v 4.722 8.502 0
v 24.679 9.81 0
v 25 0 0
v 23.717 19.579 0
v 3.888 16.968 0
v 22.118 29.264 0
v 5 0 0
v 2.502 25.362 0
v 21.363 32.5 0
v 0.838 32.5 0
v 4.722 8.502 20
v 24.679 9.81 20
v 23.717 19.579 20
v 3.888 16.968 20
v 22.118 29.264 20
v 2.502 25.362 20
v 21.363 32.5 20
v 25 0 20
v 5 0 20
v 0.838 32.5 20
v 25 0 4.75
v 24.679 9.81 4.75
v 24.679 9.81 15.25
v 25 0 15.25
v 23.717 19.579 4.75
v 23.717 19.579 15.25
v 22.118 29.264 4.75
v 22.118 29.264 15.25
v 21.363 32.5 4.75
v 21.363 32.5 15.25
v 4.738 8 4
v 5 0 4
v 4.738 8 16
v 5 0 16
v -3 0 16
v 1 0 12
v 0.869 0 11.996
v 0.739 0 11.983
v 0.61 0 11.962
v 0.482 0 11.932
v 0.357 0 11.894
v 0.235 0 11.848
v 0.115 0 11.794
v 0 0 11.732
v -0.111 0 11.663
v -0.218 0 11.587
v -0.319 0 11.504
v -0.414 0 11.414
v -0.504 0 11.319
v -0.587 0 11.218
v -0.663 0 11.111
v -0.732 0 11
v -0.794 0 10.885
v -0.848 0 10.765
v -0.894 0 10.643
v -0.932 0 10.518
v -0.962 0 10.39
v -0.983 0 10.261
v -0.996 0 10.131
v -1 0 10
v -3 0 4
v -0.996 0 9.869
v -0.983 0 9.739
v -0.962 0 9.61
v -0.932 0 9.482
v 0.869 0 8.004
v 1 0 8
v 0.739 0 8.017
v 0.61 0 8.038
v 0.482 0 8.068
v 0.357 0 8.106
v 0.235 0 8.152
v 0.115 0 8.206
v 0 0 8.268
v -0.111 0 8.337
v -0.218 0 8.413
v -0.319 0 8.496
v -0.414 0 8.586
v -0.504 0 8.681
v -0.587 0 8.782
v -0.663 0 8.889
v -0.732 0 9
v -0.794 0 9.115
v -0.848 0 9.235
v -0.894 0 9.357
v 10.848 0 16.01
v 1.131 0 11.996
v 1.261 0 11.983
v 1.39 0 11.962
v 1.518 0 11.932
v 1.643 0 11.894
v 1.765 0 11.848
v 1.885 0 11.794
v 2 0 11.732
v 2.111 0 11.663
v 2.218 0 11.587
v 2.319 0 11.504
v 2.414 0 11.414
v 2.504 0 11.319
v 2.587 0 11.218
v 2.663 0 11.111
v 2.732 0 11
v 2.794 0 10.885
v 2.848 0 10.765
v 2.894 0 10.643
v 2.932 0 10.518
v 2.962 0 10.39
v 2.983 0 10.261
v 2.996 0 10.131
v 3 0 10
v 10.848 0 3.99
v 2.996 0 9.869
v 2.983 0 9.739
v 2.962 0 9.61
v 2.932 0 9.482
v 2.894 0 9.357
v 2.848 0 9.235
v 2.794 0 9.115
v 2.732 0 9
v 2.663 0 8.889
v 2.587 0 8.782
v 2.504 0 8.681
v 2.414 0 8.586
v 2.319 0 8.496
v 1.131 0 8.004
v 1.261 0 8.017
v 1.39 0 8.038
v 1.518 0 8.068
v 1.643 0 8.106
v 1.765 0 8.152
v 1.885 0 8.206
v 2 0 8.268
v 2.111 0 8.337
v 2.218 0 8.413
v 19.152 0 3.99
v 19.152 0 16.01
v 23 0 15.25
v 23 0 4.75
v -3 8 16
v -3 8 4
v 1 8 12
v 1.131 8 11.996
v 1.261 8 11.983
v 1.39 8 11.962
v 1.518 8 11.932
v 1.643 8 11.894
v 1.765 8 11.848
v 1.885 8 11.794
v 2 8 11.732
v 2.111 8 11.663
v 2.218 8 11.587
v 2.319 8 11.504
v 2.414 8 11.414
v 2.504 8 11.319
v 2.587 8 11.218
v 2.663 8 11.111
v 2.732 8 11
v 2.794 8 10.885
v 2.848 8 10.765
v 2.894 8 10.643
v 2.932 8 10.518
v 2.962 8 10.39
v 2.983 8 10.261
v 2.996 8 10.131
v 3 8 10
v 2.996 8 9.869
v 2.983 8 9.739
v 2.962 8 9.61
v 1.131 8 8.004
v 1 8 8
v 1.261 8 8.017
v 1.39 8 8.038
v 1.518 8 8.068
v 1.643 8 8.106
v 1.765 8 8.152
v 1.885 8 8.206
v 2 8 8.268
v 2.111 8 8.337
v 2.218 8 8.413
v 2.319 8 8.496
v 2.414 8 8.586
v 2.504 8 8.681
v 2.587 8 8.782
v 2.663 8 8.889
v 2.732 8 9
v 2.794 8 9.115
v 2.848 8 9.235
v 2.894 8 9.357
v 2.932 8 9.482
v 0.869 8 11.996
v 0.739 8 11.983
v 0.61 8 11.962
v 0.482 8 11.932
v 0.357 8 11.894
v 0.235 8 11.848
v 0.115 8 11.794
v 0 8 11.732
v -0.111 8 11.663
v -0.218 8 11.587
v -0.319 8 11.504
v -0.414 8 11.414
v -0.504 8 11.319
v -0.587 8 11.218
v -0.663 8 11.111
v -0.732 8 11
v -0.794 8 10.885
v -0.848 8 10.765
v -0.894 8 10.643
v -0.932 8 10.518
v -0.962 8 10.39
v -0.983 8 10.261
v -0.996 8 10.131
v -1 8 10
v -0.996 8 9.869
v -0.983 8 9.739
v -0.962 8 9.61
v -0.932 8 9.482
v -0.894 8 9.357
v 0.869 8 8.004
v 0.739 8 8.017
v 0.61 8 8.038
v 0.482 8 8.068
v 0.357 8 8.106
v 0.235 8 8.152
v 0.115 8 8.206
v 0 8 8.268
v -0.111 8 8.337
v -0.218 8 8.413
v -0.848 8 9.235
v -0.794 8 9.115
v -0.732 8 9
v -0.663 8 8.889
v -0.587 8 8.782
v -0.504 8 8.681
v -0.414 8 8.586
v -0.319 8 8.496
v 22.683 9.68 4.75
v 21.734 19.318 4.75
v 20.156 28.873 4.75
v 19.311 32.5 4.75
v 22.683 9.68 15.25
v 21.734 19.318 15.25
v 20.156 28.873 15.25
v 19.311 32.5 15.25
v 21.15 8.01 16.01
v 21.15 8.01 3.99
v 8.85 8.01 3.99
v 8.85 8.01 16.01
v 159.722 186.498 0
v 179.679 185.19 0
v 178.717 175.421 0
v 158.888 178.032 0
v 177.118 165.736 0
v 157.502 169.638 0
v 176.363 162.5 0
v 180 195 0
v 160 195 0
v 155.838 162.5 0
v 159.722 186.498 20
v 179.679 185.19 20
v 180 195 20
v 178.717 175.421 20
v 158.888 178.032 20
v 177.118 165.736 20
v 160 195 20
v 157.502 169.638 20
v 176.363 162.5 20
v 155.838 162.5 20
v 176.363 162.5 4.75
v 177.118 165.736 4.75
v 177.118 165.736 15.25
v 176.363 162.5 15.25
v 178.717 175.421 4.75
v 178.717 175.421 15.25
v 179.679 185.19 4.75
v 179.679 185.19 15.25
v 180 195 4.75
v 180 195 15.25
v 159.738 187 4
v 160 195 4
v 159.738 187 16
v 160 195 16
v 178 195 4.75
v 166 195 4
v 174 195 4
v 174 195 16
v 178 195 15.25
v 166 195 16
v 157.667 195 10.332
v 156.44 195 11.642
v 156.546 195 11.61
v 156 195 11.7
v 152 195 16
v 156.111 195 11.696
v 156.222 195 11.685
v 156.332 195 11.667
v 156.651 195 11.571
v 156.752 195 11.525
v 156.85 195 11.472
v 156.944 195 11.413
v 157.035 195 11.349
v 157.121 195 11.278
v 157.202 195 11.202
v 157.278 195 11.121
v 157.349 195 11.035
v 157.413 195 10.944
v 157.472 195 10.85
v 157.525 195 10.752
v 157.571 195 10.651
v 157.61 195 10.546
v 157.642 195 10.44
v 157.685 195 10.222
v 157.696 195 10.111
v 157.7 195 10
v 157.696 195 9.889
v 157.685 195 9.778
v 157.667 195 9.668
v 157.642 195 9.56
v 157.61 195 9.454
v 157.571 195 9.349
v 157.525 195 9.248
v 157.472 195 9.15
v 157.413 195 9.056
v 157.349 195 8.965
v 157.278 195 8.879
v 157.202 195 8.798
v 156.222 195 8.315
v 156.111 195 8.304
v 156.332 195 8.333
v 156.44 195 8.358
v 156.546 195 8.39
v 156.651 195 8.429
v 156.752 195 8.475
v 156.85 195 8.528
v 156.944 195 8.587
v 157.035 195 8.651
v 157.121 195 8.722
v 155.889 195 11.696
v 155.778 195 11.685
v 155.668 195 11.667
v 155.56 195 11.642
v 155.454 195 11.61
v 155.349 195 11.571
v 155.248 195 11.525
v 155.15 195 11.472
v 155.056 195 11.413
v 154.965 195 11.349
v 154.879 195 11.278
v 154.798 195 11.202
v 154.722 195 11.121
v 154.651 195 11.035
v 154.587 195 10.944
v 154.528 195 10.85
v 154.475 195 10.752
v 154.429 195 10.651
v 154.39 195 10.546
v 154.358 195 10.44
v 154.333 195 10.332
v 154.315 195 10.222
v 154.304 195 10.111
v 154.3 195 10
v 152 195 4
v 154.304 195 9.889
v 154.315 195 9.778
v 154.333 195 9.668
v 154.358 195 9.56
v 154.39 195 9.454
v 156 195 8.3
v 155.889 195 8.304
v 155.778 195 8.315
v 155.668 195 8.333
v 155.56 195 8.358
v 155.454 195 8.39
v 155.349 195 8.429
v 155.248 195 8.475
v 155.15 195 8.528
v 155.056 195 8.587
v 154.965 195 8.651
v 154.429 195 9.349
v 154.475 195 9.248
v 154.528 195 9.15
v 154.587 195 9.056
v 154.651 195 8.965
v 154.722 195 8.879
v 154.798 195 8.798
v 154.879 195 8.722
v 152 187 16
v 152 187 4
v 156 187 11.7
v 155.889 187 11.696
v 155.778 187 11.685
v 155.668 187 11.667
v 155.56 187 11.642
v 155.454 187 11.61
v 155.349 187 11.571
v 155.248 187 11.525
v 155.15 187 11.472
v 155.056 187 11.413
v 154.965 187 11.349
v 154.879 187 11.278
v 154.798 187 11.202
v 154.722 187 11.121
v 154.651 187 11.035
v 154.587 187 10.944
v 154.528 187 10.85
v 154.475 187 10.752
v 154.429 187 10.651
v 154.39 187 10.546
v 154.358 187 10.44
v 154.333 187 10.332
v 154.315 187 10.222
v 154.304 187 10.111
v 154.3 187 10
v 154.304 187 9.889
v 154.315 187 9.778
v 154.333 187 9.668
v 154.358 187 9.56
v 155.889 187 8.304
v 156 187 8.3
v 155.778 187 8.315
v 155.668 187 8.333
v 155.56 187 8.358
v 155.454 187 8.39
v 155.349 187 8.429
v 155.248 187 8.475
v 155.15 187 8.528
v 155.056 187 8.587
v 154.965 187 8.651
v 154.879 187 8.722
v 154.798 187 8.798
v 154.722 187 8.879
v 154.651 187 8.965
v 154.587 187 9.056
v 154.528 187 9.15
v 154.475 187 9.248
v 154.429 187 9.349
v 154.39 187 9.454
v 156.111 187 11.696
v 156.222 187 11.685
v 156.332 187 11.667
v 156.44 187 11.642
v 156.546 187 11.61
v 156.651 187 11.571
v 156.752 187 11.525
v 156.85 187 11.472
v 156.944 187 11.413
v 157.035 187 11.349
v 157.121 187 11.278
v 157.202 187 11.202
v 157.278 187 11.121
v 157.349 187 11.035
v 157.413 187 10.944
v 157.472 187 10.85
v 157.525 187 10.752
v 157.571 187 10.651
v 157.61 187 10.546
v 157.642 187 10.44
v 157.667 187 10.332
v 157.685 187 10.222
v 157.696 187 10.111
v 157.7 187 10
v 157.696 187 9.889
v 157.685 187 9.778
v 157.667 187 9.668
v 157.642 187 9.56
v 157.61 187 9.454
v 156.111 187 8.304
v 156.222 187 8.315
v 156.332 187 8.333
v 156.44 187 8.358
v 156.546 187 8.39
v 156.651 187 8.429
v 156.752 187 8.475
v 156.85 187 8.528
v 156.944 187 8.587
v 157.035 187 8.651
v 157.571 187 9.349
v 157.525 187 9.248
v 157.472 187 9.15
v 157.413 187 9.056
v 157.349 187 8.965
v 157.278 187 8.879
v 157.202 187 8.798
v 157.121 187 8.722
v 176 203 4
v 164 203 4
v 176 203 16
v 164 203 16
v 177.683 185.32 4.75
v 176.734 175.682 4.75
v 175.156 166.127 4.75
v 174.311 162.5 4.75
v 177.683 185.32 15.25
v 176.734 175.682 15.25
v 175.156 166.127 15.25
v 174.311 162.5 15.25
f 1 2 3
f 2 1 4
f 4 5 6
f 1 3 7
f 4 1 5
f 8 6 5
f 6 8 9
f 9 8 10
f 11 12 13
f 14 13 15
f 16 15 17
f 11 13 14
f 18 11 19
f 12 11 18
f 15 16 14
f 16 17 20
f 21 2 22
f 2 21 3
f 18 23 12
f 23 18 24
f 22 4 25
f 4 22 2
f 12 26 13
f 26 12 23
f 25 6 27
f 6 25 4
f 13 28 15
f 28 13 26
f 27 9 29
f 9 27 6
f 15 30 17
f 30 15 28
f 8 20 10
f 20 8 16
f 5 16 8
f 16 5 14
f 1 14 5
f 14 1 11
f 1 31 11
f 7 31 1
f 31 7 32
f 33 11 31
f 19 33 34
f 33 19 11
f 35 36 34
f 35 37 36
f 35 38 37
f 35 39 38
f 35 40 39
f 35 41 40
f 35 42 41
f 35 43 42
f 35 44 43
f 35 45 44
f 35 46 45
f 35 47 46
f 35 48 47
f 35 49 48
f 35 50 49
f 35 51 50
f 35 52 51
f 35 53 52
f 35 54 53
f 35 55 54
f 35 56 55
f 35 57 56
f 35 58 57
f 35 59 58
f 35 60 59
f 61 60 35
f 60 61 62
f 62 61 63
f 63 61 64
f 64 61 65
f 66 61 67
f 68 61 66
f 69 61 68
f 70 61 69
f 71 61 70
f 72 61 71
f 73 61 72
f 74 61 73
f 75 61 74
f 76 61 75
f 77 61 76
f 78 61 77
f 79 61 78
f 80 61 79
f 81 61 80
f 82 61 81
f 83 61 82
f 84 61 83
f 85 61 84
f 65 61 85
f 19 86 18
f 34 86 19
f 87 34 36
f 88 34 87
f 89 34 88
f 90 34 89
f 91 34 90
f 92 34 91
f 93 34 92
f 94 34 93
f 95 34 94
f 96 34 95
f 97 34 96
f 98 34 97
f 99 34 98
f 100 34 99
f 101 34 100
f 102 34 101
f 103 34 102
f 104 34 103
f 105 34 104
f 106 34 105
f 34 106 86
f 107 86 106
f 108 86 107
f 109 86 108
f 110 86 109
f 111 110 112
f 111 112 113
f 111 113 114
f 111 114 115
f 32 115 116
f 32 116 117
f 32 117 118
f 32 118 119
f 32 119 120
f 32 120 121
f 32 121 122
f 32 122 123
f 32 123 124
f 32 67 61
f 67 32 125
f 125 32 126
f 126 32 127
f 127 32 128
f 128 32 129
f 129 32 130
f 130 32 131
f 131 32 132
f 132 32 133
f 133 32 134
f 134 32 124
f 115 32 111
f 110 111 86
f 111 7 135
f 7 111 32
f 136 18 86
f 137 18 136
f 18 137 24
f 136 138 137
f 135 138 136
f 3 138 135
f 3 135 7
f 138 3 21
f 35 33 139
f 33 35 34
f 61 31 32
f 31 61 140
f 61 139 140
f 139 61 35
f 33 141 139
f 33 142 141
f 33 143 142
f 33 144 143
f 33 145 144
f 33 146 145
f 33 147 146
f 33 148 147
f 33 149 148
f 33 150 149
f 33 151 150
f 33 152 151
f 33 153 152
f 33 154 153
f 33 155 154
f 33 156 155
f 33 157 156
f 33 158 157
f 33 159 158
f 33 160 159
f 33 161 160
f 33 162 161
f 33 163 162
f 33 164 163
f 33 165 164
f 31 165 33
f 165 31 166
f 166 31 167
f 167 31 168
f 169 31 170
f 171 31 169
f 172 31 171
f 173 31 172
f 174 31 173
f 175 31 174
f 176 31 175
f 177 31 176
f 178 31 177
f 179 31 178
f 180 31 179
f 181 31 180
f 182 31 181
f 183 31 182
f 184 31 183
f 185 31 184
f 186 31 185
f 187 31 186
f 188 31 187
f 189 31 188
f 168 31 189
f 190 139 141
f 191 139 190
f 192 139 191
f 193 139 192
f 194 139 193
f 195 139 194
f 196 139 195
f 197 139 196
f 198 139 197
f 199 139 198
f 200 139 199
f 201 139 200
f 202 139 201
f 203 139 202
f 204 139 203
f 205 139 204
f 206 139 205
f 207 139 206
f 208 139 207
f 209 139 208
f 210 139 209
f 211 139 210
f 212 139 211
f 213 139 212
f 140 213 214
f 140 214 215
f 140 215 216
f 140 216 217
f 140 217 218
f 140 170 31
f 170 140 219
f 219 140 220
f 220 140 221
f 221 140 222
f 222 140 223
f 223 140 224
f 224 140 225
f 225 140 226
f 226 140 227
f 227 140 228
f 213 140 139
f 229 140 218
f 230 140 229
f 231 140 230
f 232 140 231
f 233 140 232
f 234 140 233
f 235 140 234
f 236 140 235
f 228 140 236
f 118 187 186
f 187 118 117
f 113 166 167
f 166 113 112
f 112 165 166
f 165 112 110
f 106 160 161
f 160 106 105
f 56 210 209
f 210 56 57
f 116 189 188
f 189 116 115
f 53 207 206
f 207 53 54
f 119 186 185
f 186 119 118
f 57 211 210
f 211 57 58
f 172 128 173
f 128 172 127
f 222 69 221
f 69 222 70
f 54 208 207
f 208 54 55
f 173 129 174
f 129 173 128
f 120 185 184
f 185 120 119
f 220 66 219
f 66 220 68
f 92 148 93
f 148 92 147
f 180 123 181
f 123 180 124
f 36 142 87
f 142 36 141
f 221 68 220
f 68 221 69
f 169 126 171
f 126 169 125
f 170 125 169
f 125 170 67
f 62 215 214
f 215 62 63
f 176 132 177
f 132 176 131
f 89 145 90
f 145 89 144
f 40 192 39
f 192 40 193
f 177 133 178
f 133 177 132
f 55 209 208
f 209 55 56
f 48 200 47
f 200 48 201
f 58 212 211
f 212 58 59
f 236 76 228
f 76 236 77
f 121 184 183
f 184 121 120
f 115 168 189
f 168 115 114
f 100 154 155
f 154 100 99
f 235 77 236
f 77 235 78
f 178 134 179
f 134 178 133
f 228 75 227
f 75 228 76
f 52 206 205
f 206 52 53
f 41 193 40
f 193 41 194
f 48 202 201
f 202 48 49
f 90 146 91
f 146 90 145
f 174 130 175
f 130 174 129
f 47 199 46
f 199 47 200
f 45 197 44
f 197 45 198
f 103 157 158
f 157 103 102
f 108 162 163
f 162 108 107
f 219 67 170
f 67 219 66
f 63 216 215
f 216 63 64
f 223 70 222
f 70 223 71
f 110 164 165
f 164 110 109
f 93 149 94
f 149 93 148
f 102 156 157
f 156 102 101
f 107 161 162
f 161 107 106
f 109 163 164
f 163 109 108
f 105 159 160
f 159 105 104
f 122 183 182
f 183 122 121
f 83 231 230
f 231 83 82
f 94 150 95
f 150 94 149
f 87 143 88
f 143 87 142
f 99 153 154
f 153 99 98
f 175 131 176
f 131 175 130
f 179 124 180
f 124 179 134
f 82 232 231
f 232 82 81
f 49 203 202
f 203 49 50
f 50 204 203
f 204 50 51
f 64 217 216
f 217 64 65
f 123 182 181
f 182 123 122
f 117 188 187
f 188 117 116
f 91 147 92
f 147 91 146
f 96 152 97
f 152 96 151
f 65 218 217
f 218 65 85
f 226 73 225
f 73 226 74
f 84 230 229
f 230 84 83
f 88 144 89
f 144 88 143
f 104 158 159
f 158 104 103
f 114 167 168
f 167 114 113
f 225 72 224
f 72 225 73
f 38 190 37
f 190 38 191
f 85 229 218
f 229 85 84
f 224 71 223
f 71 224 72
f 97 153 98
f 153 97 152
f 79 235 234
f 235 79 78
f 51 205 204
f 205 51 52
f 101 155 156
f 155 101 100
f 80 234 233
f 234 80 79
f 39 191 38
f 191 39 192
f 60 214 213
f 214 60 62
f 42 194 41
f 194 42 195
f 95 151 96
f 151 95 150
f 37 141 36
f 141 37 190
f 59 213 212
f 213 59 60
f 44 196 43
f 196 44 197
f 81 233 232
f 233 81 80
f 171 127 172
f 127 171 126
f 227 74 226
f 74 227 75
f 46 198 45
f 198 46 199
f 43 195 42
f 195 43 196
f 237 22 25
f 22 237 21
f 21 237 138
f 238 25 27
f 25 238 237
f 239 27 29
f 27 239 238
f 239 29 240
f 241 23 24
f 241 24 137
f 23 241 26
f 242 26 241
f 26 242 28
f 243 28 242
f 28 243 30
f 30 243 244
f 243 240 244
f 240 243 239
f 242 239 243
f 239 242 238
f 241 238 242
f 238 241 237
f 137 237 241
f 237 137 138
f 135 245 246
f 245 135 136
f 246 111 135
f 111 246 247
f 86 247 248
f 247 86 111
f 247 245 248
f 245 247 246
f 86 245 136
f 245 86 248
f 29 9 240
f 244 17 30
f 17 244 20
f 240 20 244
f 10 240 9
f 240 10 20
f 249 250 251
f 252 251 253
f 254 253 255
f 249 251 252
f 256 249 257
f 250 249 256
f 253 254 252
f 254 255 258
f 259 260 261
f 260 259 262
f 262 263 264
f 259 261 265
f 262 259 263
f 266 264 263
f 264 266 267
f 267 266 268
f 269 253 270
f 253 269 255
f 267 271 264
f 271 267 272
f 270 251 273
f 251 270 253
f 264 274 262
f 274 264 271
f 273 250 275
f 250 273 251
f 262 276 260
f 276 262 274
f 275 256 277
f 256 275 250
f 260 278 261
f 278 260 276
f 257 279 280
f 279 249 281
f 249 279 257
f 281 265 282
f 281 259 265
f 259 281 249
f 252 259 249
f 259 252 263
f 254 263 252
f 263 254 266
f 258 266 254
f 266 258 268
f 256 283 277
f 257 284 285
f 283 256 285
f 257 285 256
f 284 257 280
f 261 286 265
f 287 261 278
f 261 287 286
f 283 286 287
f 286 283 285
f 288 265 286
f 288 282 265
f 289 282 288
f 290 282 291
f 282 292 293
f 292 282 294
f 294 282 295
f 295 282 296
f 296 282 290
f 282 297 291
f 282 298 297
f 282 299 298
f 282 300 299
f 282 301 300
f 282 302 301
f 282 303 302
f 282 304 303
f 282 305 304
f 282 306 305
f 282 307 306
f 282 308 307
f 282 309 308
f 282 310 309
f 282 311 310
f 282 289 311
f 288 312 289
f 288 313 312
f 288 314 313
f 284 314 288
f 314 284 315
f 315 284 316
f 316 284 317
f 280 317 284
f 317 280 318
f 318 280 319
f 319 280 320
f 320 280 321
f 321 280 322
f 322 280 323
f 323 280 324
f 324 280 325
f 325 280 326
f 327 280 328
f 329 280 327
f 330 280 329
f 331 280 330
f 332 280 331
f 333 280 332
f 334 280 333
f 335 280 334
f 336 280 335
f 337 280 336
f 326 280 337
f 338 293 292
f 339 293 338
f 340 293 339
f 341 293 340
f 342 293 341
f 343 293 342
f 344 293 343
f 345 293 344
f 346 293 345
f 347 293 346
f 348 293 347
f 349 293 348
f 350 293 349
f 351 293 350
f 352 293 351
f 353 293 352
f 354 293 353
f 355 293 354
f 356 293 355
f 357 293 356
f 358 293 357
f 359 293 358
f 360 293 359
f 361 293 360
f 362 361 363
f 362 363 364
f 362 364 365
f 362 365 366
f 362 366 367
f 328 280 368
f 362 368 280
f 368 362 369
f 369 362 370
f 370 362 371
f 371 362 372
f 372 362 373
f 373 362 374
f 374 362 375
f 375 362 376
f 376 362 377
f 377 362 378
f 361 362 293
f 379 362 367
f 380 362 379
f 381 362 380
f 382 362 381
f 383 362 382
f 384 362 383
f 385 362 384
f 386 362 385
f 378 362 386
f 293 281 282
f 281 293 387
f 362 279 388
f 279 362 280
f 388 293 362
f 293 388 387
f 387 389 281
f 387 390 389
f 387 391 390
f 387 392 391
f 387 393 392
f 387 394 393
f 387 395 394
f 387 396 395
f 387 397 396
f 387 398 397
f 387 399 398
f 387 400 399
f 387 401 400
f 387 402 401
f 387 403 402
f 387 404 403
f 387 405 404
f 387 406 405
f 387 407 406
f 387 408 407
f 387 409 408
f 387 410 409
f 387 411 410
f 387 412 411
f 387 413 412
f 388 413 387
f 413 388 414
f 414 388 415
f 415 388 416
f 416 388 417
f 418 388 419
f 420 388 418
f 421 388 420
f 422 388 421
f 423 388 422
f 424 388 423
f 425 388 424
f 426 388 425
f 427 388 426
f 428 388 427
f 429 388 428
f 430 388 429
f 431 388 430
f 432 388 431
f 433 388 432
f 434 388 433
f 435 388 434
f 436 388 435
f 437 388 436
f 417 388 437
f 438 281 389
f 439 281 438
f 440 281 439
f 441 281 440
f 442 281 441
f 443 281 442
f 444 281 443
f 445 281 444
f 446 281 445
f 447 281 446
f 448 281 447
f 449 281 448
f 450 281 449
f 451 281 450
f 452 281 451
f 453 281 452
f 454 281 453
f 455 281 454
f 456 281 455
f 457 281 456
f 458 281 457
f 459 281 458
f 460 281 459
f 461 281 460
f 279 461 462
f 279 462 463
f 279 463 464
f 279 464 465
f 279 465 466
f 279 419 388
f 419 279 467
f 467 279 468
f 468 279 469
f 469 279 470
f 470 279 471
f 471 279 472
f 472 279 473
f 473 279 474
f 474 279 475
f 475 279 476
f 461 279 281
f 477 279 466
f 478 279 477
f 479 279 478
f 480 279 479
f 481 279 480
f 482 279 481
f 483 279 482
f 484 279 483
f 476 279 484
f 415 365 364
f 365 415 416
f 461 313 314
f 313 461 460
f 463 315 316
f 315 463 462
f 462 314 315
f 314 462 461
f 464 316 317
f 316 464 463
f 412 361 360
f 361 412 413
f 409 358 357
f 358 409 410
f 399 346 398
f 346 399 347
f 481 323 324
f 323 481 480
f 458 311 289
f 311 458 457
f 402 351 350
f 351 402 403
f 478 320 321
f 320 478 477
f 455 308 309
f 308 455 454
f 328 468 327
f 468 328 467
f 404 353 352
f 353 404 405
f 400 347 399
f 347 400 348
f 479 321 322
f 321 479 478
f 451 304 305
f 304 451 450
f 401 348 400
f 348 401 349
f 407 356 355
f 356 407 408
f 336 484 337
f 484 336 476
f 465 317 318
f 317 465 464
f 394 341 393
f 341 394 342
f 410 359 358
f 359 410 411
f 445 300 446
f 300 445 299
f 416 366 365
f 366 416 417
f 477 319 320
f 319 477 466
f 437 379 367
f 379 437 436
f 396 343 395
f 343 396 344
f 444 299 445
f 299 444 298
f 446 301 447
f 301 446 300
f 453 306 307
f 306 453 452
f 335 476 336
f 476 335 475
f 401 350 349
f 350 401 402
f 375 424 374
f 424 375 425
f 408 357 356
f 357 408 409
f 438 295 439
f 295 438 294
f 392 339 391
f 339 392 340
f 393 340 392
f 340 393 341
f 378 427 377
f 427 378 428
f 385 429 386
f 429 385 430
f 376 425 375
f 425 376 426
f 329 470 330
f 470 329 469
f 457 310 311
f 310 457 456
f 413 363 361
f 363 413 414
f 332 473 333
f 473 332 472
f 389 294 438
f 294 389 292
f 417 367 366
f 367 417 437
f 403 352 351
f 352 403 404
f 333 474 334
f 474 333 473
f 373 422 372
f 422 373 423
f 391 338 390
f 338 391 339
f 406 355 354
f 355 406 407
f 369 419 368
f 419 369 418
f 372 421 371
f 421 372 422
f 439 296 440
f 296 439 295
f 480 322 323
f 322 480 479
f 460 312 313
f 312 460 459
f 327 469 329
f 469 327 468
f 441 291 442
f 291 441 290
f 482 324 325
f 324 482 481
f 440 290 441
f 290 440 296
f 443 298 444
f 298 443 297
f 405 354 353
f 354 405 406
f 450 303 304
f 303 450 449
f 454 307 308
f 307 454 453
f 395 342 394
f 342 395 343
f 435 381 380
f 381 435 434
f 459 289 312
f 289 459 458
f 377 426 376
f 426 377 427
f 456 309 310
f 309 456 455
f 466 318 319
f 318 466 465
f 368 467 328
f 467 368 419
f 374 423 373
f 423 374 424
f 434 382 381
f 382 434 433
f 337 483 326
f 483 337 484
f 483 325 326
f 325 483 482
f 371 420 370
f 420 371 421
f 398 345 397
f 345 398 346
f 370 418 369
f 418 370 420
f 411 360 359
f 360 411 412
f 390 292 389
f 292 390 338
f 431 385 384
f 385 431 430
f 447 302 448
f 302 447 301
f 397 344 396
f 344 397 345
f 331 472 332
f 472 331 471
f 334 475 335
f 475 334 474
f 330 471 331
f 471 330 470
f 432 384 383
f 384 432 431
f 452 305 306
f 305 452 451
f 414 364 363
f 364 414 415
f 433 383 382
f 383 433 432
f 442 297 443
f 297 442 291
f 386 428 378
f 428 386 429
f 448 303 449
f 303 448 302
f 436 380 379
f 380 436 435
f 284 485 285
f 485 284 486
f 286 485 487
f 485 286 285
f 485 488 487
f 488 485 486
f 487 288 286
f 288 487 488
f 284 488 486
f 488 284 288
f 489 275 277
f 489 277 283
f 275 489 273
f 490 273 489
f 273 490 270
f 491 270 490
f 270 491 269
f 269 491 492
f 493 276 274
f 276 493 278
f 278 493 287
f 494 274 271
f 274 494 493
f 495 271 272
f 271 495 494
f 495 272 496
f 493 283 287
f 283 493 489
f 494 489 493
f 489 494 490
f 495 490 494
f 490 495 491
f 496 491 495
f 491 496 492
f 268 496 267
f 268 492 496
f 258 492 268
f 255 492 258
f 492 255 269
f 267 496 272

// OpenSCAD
// file: rim_segment.scad
// ferris/rim_segment.scad
// Quarter (90 deg) rim arc with integrated spokes, outer LED groove,
// end dovetails and tangential M3 insert bosses.
// 8 of these make the two discs (4 per disc). All segments are identical;
// segment B = segment A rotated +90 deg, so the tenon on the 90 deg end mates
// with the mortise on the next segment's 0 deg end.

include <../params.scad>;
use <../lib/dovetail.scad>;

dt_h = 12;              // dovetail height (z), centred in the 20 mm band
dt_z = (rim_depth - dt_h) / 2;   // = 4
boss_side = 8;         // tangential + radial size of the joint boss
boss_z = 12;
boss_r_out = rim_inner_r;        // boss hangs inward from the inner rim face
boss_r_in  = rim_inner_r - boss_side;
boss_hole_r = (boss_r_out + boss_r_in) / 2;   // radius at which the bolt runs

module spoke() {
    // radial beam from the mount pad out to the inner rim, plus a bolt pad
    beam_r0 = spoke_mount_r - 2;
    beam_r1 = rim_inner_r + 2;   // overlap into rim for a clean union
    difference() {
        union() {
            translate([(beam_r0 + beam_r1)/2, 0, rim_depth/2])
                cube([beam_r1 - beam_r0, spoke_width, spoke_depth], center = true);
            translate([spoke_mount_r, 0, rim_depth/2])
                cylinder(d = spoke_pad_d, h = spoke_depth, center = true);
        }
        // M3 clearance to bolt onto the hub face
        translate([spoke_mount_r, 0, -1])
            cylinder(d = m3_clear, h = rim_depth + 2);
    }
}

module joint_boss(hole_d) {
    // block hanging inward from the inner rim, with a tangential bolt hole.
    // Modelled at the 0 deg end (face on the x-z plane, y=0), protruding +y.
    difference() {
        translate([boss_r_in, 0, (rim_depth - boss_z)/2])
            cube([boss_side, boss_side, boss_z]);
        // tangential hole along +y at radius boss_hole_r, mid height
        translate([boss_hole_r, -0.1, rim_depth/2])
            rotate([-90, 0, 0])
                cylinder(d = hole_d, h = boss_side + 0.2);
    }
}

module rim_segment() {
    difference() {
        union() {
            // --- annular band, first-quadrant 90 deg wedge ---
            intersection() {
                linear_extrude(rim_depth)
                    difference() { circle(rim_outer_r); circle(rim_inner_r); }
                translate([0, 0, -1])
                    cube([rim_outer_r + 5, rim_outer_r + 5, rim_depth + 2]);
            }
            // --- spokes at 22.5 and 67.5 deg ---
            rotate([0, 0, 22.5]) spoke();
            rotate([0, 0, 67.5]) spoke();
            // --- dovetail tenon on the 90 deg end (protrudes -x, tip wider) ---
            translate([0, rim_outer_r - rim_radial_w/2, dt_z])
                rotate([0, 0, 90])
                    dovetail_tenon(h = dt_h);
            // --- insert boss on 0 deg end, clearance-lug on 90 deg end ---
            joint_boss(m3_insert);                       // 0 deg end (insert)
            mirror([1, -1, 0]) joint_boss(m3_clear);     // 90 deg end (clearance)
        }
        // --- LED groove on the outer periphery ---
        translate([0, 0, (rim_depth - led_groove_w)/2])
            linear_extrude(led_groove_w)
                difference() {
                    circle(rim_outer_r + 5);
                    circle(rim_outer_r - led_groove_d);
                }
        // --- dovetail mortise on the 0 deg end (opens +y) ---
        translate([rim_outer_r - rim_radial_w/2, 0, dt_z])
            dovetail_mortise(h = dt_h);
        // --- gondola axle through-hole (Ø3 rod, E-ring retained outside) ---
        rotate([0, 0, gon_axle_seg_angle])
            translate([gon_axle_r, 0, -1])
                cylinder(d = gon_axle_hole_d, h = rim_depth + 2);
    }
}

rim_segment();
// file: ../lib/dovetail.scad
// lib/dovetail.scad
// Shared joinery modules: dovetail tenon/mortise, M3 insert boss, rounded box.
// Depends on values in params.scad (include it in the calling file).

// A dovetail tenon: a flared prism that grows wider toward its tip so it locks
// against a matching mortise when slid in along +y.
//   len   : protrusion length (along +y)
//   base_w: width at the root (x, near the part)
//   tip_w : width at the tip (x, wider -> self locking)
//   h     : height (z)
// Literal defaults keep this library self-contained under `use <>` (which does
// not import the caller's params). Callers pass explicit sizes where needed.
module dovetail_tenon(len = 8, base_w = 8, tip_w = 12, h = 10) {
    linear_extrude(height = h)
        polygon(points = [
            [-base_w/2, 0],
            [ base_w/2, 0],
            [ tip_w/2,  len],
            [-tip_w/2,  len],
        ]);
}

// Matching mortise volume (subtract this). Enlarged by tol_dovetail per side.
module dovetail_mortise(len = 8, base_w = 8, tip_w = 12, h = 10, clr = 0.15) {
    // extend slightly beyond both faces so the cut is clean
    translate([0, -0.01, -0.01])
        linear_extrude(height = h + 0.02)
            polygon(points = [
                [-(base_w/2 + clr), 0],
                [ (base_w/2 + clr), 0],
                [ (tip_w/2 + clr),  len + 0.02],
                [-(tip_w/2 + clr),  len + 0.02],
            ]);
}

// Cylindrical boss with a blind hole for a heat-set insert.
//   boss_d : outer diameter of the boss
//   boss_h : height
//   hole_d : insert press-hole diameter (params: m3_insert)
//   hole_depth : blind hole depth (0 = through)
module insert_boss(boss_d = 8, boss_h = 8, hole_d = 4.0, hole_depth = 0) {
    difference() {
        cylinder(d = boss_d, h = boss_h);
        translate([0, 0, hole_depth == 0 ? -0.01 : boss_h - hole_depth])
            cylinder(d = hole_d, h = hole_depth == 0 ? boss_h + 0.02 : hole_depth + 0.01);
    }
}

// Rounded rectangular box shell (open top) used by gondola / recesses.
module rounded_box(x, y, z, r = 2) {
    hull() {
        for (sx = [-1, 1], sy = [-1, 1])
            translate([sx * (x/2 - r), sy * (y/2 - r), 0])
                cylinder(r = r, h = z);
    }
}

// A simple rectangular slot cutter (for tabs), centered on x, open along z.
module slot(w, t, d) {
    translate([-w/2, -t/2, -0.01])
        cube([w, t, d + 0.02]);
}
// main file
// joint_test.scad
// Small coupons cut from the rim segment ends to test the dovetail fit
// (and the M3 joint bosses) without printing two full 2.2 h segments.
// Prints in ~15 min: piece A = 0 deg end (mortise + insert boss),
// piece B = 90 deg end (tenon + clearance lug), laid side by side.

include <../params.scad>
use <../lib/dovetail.scad>
use <rim_segment.scad>

coupon = 45;   // cube side of the cut region around each joint end

module end_coupon_0deg() {
    // region around the 0 deg end: rim band sits near (rim_outer_r, 0)
    intersection() {
        rim_segment();
        translate([rim_inner_r - 12, -coupon/2 + 10, -1])
            cube([rim_radial_w + 30, coupon, rim_depth + 2]);
    }
}

module end_coupon_90deg() {
    // region around the 90 deg end: rim band sits near (0, rim_outer_r)
    intersection() {
        rim_segment();
        translate([-coupon/2 + 10, rim_inner_r - 12, -1])
            cube([coupon, rim_radial_w + 30, rim_depth + 2]);
    }
}

// lay both coupons flat, side by side
translate([-rim_inner_r + 5, 0, 0]) end_coupon_0deg();
rotate([0, 0, -90])
    translate([-5 - rim_inner_r - 60, rim_inner_r - 100, 0])
        end_coupon_90deg();
